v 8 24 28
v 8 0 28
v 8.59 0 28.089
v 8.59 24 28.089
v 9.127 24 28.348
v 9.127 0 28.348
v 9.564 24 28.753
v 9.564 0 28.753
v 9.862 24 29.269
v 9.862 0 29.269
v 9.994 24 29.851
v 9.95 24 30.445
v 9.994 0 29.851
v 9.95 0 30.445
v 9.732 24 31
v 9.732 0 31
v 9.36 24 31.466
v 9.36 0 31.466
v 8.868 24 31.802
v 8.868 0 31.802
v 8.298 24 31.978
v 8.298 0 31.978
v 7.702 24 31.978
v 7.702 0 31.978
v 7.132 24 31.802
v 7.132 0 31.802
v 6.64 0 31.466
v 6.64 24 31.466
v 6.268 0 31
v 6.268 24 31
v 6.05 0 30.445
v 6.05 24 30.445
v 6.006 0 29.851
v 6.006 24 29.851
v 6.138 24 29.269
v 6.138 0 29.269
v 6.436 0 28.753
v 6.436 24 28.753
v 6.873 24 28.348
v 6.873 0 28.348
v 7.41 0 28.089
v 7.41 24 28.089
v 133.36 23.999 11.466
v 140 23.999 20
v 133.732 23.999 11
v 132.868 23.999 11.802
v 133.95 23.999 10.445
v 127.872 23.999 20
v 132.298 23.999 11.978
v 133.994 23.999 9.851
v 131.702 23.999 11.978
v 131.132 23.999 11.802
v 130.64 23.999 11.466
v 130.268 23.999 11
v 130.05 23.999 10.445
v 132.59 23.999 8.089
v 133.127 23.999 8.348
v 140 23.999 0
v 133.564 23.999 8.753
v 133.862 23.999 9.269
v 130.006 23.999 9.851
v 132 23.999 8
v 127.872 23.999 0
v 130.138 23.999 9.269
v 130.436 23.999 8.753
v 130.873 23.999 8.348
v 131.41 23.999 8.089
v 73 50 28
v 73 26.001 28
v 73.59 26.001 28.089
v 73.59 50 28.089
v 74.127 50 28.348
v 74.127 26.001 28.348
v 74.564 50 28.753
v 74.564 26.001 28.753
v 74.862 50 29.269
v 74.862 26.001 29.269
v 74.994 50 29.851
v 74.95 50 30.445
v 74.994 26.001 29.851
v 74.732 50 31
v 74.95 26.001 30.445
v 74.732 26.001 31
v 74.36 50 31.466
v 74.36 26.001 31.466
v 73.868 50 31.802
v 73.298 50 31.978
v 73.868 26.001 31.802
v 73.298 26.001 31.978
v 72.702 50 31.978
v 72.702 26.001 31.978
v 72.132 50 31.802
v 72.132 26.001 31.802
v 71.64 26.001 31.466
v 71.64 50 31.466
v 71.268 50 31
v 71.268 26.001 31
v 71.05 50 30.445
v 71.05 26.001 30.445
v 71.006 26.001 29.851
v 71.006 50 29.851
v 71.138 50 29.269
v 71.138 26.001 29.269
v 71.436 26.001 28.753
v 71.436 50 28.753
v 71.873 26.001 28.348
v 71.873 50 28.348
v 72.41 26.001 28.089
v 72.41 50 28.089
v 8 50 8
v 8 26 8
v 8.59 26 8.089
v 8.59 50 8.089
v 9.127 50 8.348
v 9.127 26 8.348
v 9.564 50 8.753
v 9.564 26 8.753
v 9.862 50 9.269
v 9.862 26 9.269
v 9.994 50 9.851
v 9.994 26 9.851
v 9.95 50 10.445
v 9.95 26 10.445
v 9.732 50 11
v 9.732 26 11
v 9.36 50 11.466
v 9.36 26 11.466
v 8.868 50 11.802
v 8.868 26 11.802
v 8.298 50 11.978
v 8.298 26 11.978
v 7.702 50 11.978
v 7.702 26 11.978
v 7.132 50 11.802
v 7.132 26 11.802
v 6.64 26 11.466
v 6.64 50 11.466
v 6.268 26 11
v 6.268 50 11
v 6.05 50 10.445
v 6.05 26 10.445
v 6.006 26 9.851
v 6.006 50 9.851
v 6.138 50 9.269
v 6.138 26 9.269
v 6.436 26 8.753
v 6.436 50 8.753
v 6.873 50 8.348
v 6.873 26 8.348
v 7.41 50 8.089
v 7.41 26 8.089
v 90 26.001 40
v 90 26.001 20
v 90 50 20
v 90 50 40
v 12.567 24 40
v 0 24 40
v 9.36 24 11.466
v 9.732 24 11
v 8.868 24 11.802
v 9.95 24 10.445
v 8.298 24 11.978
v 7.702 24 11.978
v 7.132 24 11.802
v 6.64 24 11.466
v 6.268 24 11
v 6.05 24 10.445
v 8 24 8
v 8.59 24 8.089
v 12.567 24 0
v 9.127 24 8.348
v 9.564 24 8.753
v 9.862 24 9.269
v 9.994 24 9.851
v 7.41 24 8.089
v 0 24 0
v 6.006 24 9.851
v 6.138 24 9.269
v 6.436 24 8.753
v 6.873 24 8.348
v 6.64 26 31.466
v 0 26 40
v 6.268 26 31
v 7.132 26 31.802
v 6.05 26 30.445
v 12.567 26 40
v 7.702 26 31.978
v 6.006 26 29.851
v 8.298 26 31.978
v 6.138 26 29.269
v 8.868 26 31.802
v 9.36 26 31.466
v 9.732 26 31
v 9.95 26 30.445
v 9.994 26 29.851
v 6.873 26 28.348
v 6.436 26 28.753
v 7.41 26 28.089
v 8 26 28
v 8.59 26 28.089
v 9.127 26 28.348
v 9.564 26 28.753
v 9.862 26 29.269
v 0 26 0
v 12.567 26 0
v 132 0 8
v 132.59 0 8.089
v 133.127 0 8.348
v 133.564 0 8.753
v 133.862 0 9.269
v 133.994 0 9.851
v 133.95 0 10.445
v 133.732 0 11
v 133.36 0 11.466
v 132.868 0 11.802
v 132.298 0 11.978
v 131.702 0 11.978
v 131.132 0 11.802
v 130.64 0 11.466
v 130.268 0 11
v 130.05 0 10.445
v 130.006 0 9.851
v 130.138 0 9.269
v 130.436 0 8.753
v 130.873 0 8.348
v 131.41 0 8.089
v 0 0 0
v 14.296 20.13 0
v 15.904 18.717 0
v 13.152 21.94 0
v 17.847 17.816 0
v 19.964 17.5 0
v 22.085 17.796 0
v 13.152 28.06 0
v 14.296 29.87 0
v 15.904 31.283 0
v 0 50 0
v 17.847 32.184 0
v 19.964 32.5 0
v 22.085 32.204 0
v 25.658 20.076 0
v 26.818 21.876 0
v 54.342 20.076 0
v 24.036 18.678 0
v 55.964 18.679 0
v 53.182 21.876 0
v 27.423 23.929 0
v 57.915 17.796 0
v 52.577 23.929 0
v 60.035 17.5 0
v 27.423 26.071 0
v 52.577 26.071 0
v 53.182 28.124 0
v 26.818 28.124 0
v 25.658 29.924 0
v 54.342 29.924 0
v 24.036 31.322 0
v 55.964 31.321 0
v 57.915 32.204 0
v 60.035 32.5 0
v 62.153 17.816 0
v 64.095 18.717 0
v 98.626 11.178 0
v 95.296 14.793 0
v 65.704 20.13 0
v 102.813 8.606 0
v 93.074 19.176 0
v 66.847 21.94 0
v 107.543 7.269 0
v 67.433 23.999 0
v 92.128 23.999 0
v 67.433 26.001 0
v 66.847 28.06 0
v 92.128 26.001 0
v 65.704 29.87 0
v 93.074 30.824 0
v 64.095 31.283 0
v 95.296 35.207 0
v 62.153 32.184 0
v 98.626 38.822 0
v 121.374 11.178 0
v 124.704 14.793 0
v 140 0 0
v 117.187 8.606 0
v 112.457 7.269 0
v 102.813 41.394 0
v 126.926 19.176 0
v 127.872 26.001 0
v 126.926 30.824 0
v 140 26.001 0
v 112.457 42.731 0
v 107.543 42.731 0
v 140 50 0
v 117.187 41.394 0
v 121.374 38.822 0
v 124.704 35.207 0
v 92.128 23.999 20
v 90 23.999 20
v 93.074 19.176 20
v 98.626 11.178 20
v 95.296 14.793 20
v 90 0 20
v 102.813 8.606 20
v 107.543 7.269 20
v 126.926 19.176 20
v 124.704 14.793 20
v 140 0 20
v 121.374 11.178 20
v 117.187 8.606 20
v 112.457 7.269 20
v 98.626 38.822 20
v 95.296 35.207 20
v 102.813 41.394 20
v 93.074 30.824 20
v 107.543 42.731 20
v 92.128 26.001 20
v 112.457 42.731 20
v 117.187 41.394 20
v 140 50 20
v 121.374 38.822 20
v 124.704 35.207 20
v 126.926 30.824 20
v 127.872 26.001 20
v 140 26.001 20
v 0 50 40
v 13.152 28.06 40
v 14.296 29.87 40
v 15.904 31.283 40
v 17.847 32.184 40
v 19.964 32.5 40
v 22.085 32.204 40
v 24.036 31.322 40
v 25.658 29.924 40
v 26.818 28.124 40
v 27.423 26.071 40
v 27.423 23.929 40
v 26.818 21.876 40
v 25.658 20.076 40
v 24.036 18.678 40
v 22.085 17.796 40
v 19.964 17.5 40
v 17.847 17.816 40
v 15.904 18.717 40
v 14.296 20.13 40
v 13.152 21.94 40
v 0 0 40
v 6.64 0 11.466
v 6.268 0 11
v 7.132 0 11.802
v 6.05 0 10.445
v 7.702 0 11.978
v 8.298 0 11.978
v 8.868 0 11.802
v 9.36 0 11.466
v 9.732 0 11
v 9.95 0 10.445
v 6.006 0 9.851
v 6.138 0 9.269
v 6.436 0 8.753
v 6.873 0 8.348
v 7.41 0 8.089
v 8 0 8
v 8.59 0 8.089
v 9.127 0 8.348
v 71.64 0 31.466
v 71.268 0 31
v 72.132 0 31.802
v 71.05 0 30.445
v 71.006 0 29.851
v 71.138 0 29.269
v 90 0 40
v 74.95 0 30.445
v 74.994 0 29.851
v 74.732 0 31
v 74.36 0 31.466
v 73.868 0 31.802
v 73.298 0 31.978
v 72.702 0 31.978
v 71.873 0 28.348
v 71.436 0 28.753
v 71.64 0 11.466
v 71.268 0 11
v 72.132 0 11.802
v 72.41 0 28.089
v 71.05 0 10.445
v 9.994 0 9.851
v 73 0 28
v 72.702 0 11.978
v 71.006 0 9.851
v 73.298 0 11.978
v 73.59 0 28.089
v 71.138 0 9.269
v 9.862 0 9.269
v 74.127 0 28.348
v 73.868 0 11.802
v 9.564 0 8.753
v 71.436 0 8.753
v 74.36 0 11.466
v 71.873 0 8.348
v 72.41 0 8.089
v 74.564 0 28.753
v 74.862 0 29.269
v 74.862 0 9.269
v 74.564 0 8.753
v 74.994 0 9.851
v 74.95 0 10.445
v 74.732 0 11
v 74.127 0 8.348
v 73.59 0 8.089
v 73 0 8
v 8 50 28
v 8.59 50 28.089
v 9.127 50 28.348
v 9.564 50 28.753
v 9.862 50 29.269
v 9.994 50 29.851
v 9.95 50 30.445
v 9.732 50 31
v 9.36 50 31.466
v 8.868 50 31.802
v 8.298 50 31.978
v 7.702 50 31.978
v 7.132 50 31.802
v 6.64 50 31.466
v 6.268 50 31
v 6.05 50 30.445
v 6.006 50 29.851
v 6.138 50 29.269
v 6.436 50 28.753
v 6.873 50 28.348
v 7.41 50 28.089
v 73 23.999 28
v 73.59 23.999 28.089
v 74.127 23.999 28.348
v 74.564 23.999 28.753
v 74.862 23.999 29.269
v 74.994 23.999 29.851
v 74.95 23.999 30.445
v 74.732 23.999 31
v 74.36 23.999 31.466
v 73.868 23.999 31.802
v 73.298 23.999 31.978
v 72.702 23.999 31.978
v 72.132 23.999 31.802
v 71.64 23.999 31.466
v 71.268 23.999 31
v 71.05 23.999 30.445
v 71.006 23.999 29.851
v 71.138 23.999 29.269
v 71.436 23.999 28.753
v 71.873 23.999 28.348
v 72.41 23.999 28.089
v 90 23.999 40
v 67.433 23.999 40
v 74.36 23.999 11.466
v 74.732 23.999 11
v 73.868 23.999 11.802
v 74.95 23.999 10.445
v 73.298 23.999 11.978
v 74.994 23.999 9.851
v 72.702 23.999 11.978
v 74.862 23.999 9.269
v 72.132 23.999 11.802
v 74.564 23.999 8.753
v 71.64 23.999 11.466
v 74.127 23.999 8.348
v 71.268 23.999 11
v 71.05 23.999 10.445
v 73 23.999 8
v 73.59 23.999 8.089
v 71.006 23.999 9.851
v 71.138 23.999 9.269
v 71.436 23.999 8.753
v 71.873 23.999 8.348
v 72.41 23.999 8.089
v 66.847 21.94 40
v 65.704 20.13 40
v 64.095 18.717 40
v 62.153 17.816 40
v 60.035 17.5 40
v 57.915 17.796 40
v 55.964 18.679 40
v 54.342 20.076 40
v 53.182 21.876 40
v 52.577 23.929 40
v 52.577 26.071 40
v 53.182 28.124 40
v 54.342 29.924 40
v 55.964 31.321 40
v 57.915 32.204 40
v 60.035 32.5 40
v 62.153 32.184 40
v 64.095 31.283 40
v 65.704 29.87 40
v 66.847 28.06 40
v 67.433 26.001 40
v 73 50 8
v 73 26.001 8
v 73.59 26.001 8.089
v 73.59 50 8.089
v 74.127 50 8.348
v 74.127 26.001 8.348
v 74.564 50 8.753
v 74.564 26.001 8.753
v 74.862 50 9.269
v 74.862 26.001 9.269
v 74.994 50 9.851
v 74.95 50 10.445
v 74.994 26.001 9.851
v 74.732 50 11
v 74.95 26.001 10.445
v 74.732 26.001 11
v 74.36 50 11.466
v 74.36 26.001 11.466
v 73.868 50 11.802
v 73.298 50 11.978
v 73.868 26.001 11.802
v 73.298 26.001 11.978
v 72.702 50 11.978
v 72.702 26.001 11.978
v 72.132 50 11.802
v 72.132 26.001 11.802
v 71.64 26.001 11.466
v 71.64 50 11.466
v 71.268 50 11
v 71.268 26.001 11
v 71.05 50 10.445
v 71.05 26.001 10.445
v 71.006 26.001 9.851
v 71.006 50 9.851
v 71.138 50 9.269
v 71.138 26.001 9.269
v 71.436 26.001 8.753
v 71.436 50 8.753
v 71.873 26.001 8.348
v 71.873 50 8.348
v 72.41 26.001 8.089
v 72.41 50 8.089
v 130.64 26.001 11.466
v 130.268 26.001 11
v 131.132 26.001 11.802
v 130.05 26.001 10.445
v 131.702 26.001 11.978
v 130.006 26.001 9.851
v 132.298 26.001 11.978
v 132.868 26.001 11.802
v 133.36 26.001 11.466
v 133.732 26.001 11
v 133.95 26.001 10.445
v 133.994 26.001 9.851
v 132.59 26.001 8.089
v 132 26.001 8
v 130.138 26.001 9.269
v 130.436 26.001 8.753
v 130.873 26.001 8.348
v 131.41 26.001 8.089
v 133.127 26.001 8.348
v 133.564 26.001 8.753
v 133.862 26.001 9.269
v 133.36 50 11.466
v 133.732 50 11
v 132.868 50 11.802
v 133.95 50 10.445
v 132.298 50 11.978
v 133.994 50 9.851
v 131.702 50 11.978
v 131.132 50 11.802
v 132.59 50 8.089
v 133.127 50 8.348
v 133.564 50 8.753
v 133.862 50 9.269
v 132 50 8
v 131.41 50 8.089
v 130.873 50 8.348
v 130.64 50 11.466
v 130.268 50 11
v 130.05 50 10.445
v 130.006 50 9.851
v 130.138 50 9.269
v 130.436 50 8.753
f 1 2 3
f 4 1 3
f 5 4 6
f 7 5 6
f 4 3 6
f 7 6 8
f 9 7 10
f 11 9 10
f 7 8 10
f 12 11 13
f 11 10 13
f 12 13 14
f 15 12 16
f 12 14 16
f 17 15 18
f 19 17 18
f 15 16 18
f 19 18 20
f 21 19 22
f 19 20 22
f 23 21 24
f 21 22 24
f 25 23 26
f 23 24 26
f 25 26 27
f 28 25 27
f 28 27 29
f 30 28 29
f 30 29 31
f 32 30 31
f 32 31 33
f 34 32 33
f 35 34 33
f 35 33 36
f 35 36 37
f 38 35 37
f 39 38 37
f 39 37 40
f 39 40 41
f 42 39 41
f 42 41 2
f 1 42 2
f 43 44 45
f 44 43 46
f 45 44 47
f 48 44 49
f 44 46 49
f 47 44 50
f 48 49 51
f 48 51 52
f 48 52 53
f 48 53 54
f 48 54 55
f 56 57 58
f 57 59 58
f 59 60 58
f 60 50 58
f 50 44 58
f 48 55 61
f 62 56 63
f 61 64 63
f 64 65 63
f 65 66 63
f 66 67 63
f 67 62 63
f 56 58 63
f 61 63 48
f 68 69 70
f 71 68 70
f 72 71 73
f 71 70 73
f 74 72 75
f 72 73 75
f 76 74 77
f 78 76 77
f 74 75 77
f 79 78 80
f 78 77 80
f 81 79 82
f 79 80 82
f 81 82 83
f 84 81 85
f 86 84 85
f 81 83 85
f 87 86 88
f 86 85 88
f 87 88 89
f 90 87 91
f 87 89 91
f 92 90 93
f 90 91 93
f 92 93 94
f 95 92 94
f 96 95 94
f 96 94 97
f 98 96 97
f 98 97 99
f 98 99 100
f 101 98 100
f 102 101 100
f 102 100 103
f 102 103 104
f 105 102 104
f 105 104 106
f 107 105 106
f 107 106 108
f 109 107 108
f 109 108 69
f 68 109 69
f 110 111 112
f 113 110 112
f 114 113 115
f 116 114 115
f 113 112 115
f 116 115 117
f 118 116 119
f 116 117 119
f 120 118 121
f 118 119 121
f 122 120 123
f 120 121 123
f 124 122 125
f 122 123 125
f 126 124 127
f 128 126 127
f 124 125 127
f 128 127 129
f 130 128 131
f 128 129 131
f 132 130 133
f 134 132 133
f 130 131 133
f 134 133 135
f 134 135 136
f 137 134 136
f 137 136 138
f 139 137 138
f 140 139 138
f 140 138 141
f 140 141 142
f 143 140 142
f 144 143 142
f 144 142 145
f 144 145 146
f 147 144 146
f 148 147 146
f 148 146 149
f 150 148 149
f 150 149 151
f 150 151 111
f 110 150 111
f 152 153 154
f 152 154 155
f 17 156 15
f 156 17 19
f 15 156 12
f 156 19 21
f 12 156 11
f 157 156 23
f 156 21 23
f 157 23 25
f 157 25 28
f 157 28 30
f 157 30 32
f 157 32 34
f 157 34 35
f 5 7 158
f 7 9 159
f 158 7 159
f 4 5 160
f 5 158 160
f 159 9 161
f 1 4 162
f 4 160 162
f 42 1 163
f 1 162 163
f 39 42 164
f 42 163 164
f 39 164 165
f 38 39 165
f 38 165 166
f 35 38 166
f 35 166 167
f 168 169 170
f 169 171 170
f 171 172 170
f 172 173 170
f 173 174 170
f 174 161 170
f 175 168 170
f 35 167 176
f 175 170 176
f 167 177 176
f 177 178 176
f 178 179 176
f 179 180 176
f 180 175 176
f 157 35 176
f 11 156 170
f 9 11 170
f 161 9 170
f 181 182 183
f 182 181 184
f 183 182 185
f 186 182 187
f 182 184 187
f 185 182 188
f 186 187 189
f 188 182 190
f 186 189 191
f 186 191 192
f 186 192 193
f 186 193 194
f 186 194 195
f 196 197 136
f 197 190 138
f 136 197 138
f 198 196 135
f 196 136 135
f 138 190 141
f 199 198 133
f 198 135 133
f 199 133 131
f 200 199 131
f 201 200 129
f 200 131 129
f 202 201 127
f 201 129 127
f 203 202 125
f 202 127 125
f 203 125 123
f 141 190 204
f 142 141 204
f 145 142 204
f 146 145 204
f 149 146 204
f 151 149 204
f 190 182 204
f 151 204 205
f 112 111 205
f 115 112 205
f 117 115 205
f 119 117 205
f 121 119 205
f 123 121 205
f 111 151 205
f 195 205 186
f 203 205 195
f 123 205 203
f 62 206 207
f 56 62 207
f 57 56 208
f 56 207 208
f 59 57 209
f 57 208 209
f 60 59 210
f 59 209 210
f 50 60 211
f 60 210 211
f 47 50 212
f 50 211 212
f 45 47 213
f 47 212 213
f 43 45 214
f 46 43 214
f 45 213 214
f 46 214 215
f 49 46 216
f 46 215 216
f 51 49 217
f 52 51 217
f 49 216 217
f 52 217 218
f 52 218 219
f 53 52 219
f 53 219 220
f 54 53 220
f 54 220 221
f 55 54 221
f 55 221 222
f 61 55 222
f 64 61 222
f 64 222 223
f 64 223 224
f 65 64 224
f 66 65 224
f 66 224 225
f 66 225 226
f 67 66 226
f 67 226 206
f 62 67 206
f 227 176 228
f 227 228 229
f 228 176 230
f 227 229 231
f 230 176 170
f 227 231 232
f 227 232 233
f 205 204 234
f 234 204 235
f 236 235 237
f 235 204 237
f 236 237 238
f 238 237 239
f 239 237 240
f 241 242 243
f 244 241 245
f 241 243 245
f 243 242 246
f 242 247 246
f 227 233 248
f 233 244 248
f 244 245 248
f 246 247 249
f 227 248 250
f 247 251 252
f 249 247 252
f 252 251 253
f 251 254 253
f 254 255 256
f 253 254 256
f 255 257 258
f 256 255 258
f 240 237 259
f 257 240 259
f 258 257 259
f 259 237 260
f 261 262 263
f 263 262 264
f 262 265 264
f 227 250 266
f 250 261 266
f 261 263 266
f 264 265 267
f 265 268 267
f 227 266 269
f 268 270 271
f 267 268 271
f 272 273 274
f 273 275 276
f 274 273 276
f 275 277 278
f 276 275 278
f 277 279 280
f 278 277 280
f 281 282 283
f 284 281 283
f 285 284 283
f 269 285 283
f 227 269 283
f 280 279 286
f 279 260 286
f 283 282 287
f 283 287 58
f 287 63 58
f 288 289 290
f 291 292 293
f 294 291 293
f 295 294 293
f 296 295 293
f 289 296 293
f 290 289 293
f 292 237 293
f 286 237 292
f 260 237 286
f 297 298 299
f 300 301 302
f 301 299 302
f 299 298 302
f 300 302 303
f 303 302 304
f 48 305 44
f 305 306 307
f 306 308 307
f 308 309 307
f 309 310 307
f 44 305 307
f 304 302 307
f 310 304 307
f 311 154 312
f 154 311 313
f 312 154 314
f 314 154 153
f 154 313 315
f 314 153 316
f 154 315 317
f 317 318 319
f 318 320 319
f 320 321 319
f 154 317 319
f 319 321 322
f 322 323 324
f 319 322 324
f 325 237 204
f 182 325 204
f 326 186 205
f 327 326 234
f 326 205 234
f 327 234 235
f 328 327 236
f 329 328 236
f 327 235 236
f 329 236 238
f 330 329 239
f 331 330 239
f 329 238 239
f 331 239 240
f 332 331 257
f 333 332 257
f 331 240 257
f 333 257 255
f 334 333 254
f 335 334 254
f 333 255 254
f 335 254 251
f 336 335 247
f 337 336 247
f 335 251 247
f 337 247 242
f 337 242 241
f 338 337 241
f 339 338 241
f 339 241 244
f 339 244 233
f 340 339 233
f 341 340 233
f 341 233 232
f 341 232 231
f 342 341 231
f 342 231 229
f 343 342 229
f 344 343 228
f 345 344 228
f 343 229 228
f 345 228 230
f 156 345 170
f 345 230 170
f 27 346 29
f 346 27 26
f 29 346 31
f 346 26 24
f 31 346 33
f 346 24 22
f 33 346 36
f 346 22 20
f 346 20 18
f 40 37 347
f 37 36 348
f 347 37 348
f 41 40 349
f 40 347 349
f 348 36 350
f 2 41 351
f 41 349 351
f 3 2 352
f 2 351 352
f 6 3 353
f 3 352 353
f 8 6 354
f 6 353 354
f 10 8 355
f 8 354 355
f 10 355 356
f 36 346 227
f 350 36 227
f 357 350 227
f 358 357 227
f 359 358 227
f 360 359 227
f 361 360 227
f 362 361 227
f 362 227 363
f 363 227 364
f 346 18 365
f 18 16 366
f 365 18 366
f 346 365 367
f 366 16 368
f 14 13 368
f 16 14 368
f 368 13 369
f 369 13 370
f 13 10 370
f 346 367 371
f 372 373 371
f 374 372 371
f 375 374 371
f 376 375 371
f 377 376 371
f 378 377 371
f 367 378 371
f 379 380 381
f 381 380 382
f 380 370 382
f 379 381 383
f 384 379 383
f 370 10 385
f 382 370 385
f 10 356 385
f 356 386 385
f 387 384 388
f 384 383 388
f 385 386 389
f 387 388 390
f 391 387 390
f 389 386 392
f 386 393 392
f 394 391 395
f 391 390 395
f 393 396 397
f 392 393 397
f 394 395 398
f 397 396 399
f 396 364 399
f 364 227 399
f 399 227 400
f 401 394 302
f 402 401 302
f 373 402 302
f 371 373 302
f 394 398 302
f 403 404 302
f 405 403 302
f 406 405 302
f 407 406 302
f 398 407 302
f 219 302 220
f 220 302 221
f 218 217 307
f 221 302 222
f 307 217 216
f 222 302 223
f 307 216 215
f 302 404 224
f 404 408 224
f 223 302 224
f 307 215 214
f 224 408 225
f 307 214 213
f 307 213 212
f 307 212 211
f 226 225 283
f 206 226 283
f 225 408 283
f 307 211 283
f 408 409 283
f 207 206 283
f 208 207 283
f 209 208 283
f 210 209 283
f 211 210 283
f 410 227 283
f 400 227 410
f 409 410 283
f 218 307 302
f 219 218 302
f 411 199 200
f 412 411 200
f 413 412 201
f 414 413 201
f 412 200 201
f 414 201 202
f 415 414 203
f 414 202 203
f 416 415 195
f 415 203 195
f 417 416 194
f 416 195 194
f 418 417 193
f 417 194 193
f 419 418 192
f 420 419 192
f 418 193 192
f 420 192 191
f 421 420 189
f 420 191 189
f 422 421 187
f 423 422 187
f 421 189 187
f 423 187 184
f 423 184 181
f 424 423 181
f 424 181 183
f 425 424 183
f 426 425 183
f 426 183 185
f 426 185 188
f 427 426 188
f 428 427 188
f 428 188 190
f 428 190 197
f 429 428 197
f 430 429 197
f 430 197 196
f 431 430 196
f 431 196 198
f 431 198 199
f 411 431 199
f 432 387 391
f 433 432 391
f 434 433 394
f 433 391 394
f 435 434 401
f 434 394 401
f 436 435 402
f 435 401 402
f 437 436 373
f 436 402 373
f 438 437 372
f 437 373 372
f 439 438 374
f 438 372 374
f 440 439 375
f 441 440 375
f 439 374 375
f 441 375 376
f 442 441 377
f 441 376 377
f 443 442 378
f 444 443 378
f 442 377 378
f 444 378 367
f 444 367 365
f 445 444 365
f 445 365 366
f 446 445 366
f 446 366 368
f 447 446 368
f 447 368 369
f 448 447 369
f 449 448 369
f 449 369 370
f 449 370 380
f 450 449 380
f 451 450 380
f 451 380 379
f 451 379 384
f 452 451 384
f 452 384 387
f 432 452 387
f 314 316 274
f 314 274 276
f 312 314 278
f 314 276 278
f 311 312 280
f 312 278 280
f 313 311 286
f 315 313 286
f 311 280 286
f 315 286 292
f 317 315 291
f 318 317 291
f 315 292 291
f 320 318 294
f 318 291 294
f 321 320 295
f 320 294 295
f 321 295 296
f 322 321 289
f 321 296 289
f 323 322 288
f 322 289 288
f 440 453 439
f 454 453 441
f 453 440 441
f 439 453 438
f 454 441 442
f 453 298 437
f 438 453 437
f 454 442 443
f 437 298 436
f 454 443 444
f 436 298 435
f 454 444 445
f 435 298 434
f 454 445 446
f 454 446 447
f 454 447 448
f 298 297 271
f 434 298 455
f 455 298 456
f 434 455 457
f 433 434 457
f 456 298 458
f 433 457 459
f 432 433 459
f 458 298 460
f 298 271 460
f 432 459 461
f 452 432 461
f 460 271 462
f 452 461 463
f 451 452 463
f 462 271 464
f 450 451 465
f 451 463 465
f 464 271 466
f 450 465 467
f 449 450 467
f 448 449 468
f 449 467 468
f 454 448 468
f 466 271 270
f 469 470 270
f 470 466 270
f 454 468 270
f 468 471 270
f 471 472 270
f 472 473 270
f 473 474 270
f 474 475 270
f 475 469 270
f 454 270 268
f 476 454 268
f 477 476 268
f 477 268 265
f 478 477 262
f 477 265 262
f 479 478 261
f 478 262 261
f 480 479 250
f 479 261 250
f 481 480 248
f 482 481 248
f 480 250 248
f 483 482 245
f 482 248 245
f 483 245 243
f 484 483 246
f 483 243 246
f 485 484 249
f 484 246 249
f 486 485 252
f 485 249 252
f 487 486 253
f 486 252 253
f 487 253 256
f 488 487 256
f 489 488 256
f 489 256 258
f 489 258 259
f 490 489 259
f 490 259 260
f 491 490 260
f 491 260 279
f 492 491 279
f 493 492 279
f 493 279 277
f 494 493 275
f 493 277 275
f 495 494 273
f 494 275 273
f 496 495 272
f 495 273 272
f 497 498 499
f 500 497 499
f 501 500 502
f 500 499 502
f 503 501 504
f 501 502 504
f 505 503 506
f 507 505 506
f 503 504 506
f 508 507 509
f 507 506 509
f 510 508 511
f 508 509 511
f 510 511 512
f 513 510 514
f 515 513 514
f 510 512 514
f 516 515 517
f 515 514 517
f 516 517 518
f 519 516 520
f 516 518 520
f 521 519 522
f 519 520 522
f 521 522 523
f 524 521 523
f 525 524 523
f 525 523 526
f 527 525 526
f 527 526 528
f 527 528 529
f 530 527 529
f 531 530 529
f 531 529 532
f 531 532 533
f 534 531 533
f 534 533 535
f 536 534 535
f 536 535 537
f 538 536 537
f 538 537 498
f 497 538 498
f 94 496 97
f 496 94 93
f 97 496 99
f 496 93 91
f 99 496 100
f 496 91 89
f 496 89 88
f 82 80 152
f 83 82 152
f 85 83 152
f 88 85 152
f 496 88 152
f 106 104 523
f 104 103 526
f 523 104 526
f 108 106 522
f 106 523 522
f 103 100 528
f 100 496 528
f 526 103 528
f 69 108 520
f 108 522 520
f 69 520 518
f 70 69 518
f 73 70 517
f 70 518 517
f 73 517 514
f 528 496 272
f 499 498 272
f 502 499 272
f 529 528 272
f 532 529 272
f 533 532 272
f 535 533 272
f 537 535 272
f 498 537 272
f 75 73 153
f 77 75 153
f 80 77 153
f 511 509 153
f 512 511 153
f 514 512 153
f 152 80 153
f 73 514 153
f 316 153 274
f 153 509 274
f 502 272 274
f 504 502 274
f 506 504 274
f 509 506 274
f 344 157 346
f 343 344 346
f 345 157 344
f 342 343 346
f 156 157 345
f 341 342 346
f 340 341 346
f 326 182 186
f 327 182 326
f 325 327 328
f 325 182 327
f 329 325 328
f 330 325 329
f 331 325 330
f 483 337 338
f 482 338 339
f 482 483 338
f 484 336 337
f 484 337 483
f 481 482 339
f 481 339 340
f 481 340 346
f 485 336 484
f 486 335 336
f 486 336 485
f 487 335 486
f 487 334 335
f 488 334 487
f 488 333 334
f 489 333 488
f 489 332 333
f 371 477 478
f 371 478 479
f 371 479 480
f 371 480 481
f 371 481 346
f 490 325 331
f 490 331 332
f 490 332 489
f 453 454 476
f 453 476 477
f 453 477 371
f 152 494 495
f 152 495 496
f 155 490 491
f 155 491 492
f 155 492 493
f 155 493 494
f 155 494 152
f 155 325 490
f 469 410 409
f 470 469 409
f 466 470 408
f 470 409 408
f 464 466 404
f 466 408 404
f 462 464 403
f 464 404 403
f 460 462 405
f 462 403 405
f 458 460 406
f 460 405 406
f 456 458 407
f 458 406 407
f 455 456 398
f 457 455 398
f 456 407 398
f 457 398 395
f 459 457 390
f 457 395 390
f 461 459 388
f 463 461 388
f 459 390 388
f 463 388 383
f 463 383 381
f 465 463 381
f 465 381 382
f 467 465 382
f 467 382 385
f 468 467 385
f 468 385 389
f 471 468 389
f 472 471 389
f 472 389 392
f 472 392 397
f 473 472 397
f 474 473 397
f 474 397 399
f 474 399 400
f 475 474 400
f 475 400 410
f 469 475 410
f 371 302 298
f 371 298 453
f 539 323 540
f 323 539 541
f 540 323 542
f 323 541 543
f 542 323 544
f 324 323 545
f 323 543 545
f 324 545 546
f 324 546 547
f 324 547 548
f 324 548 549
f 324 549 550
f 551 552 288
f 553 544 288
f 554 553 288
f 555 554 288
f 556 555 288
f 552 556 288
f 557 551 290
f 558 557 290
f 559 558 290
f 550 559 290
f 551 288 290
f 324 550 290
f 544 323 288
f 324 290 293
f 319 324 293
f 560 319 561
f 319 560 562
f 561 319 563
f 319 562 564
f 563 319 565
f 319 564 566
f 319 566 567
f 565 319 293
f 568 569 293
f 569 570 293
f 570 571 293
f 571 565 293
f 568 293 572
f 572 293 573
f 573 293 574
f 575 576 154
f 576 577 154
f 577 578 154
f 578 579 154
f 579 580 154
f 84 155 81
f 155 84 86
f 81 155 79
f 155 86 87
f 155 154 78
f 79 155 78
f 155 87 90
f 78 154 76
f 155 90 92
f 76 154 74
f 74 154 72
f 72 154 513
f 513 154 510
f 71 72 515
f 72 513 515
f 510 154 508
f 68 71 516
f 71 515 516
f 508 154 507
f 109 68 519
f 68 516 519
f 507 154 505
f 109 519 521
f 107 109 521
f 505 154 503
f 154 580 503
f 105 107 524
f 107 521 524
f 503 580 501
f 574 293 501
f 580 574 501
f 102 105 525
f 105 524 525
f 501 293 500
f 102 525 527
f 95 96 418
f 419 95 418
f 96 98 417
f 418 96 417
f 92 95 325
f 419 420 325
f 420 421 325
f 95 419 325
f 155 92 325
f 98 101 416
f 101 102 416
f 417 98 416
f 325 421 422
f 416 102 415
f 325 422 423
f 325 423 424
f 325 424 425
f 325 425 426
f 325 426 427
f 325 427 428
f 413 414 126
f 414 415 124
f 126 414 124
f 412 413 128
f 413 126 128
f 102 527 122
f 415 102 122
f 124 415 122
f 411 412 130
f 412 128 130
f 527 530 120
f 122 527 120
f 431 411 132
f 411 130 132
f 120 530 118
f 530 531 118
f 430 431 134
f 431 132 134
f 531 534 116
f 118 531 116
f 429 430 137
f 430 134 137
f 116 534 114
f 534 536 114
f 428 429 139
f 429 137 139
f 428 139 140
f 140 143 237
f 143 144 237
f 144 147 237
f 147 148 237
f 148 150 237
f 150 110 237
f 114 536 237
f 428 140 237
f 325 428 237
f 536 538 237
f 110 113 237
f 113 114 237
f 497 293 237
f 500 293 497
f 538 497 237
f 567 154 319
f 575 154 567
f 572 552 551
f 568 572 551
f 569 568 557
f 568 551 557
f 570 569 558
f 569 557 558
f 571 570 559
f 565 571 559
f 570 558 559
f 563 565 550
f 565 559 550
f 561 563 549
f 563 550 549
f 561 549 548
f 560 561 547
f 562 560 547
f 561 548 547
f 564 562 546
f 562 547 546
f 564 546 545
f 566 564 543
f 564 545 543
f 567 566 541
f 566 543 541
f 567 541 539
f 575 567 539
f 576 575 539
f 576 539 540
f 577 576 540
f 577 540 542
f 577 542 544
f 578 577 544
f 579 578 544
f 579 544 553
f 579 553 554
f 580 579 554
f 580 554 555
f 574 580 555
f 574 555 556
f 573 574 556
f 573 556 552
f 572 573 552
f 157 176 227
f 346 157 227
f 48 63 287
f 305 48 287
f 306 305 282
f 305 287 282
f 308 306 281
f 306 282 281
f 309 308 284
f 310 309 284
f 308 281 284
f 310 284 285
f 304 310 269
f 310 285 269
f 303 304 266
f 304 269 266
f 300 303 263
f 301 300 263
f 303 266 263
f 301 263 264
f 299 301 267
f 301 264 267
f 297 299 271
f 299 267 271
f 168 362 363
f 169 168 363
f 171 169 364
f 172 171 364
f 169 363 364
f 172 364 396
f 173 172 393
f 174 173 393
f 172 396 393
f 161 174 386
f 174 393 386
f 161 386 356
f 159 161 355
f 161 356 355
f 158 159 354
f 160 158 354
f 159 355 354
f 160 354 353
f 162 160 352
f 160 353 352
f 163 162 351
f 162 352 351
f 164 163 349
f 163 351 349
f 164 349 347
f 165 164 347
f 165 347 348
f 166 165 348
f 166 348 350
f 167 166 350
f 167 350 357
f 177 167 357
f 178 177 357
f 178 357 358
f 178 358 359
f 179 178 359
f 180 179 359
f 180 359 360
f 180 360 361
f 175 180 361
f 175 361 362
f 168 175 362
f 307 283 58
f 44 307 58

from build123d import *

# Parameters (mm, degrees)
EXTRUDE_1_DEPTH     = 40
SKETCH_8_R          = 2
SKETCH_8_W          = 50
SKETCH_8_H          = 20
CUT_EXTRUDE_1_DEPTH = 50


with BuildPart() as part:
    # Эскиз1 → Бобышка-Вытянуть1 (new body)
    with BuildSketch(Plane.XY):
        with BuildLine():
            Line((67.432912675, 26.000904174), (92.128005404, 26.000904174))
            ThreePointArc((92.128005404, 26.000904174), (110, 42.9), (127.871994596, 26.000904174))
            Line((127.871994596, 26.000904174), (140, 26.000904174))
            Line((140, 26.000904174), (140, 50))
            Line((140, 50), (0, 50))
            Line((0, 50), (0, 26))
            Line((0, 26), (12.566965626, 26))
            ThreePointArc((12.566965626, 26), (27.5, 25), (12.566965626, 24))
            Line((12.566965626, 24), (0, 24))
            Line((0, 24), (0, 0))
            Line((0, 0), (140, 0))
            Line((140, 0), (140, 23.999095826))
            Line((140, 23.999095826), (127.871994596, 23.999095826))
            ThreePointArc((127.871994596, 23.999095826), (110, 7.1), (92.128005404, 23.999095826))
            Line((92.128005404, 23.999095826), (67.432912675, 23.999095826))
            ThreePointArc((67.432912675, 23.999095826), (52.5, 25), (67.432912675, 26.000904174))
        make_face()
    extrude(amount=EXTRUDE_1_DEPTH)

    # Эскиз8 → Вырез-Вытянуть1 (cut)
    with BuildSketch(Plane.XZ):
        with Locations(Location((8, 30, 0), (0, 0, 270))):
            Circle(SKETCH_8_R)
        with Locations(Location((8, 10, 0), (0, 0, 270))):
            Circle(SKETCH_8_R)
        with Locations(Location((132, 10, 0), (0, 0, 270))):
            Circle(SKETCH_8_R)
        with Locations(Location((73, 30, 0), (0, 0, 270))):
            Circle(SKETCH_8_R)
        with Locations(Location((73, 10, 0), (0, 0, 270))):
            Circle(SKETCH_8_R)
        with Locations((115, 30)):
            Rectangle(SKETCH_8_W, SKETCH_8_H)
    extrude(amount=-CUT_EXTRUDE_1_DEPTH, mode=Mode.SUBTRACT)


solid = part.part
